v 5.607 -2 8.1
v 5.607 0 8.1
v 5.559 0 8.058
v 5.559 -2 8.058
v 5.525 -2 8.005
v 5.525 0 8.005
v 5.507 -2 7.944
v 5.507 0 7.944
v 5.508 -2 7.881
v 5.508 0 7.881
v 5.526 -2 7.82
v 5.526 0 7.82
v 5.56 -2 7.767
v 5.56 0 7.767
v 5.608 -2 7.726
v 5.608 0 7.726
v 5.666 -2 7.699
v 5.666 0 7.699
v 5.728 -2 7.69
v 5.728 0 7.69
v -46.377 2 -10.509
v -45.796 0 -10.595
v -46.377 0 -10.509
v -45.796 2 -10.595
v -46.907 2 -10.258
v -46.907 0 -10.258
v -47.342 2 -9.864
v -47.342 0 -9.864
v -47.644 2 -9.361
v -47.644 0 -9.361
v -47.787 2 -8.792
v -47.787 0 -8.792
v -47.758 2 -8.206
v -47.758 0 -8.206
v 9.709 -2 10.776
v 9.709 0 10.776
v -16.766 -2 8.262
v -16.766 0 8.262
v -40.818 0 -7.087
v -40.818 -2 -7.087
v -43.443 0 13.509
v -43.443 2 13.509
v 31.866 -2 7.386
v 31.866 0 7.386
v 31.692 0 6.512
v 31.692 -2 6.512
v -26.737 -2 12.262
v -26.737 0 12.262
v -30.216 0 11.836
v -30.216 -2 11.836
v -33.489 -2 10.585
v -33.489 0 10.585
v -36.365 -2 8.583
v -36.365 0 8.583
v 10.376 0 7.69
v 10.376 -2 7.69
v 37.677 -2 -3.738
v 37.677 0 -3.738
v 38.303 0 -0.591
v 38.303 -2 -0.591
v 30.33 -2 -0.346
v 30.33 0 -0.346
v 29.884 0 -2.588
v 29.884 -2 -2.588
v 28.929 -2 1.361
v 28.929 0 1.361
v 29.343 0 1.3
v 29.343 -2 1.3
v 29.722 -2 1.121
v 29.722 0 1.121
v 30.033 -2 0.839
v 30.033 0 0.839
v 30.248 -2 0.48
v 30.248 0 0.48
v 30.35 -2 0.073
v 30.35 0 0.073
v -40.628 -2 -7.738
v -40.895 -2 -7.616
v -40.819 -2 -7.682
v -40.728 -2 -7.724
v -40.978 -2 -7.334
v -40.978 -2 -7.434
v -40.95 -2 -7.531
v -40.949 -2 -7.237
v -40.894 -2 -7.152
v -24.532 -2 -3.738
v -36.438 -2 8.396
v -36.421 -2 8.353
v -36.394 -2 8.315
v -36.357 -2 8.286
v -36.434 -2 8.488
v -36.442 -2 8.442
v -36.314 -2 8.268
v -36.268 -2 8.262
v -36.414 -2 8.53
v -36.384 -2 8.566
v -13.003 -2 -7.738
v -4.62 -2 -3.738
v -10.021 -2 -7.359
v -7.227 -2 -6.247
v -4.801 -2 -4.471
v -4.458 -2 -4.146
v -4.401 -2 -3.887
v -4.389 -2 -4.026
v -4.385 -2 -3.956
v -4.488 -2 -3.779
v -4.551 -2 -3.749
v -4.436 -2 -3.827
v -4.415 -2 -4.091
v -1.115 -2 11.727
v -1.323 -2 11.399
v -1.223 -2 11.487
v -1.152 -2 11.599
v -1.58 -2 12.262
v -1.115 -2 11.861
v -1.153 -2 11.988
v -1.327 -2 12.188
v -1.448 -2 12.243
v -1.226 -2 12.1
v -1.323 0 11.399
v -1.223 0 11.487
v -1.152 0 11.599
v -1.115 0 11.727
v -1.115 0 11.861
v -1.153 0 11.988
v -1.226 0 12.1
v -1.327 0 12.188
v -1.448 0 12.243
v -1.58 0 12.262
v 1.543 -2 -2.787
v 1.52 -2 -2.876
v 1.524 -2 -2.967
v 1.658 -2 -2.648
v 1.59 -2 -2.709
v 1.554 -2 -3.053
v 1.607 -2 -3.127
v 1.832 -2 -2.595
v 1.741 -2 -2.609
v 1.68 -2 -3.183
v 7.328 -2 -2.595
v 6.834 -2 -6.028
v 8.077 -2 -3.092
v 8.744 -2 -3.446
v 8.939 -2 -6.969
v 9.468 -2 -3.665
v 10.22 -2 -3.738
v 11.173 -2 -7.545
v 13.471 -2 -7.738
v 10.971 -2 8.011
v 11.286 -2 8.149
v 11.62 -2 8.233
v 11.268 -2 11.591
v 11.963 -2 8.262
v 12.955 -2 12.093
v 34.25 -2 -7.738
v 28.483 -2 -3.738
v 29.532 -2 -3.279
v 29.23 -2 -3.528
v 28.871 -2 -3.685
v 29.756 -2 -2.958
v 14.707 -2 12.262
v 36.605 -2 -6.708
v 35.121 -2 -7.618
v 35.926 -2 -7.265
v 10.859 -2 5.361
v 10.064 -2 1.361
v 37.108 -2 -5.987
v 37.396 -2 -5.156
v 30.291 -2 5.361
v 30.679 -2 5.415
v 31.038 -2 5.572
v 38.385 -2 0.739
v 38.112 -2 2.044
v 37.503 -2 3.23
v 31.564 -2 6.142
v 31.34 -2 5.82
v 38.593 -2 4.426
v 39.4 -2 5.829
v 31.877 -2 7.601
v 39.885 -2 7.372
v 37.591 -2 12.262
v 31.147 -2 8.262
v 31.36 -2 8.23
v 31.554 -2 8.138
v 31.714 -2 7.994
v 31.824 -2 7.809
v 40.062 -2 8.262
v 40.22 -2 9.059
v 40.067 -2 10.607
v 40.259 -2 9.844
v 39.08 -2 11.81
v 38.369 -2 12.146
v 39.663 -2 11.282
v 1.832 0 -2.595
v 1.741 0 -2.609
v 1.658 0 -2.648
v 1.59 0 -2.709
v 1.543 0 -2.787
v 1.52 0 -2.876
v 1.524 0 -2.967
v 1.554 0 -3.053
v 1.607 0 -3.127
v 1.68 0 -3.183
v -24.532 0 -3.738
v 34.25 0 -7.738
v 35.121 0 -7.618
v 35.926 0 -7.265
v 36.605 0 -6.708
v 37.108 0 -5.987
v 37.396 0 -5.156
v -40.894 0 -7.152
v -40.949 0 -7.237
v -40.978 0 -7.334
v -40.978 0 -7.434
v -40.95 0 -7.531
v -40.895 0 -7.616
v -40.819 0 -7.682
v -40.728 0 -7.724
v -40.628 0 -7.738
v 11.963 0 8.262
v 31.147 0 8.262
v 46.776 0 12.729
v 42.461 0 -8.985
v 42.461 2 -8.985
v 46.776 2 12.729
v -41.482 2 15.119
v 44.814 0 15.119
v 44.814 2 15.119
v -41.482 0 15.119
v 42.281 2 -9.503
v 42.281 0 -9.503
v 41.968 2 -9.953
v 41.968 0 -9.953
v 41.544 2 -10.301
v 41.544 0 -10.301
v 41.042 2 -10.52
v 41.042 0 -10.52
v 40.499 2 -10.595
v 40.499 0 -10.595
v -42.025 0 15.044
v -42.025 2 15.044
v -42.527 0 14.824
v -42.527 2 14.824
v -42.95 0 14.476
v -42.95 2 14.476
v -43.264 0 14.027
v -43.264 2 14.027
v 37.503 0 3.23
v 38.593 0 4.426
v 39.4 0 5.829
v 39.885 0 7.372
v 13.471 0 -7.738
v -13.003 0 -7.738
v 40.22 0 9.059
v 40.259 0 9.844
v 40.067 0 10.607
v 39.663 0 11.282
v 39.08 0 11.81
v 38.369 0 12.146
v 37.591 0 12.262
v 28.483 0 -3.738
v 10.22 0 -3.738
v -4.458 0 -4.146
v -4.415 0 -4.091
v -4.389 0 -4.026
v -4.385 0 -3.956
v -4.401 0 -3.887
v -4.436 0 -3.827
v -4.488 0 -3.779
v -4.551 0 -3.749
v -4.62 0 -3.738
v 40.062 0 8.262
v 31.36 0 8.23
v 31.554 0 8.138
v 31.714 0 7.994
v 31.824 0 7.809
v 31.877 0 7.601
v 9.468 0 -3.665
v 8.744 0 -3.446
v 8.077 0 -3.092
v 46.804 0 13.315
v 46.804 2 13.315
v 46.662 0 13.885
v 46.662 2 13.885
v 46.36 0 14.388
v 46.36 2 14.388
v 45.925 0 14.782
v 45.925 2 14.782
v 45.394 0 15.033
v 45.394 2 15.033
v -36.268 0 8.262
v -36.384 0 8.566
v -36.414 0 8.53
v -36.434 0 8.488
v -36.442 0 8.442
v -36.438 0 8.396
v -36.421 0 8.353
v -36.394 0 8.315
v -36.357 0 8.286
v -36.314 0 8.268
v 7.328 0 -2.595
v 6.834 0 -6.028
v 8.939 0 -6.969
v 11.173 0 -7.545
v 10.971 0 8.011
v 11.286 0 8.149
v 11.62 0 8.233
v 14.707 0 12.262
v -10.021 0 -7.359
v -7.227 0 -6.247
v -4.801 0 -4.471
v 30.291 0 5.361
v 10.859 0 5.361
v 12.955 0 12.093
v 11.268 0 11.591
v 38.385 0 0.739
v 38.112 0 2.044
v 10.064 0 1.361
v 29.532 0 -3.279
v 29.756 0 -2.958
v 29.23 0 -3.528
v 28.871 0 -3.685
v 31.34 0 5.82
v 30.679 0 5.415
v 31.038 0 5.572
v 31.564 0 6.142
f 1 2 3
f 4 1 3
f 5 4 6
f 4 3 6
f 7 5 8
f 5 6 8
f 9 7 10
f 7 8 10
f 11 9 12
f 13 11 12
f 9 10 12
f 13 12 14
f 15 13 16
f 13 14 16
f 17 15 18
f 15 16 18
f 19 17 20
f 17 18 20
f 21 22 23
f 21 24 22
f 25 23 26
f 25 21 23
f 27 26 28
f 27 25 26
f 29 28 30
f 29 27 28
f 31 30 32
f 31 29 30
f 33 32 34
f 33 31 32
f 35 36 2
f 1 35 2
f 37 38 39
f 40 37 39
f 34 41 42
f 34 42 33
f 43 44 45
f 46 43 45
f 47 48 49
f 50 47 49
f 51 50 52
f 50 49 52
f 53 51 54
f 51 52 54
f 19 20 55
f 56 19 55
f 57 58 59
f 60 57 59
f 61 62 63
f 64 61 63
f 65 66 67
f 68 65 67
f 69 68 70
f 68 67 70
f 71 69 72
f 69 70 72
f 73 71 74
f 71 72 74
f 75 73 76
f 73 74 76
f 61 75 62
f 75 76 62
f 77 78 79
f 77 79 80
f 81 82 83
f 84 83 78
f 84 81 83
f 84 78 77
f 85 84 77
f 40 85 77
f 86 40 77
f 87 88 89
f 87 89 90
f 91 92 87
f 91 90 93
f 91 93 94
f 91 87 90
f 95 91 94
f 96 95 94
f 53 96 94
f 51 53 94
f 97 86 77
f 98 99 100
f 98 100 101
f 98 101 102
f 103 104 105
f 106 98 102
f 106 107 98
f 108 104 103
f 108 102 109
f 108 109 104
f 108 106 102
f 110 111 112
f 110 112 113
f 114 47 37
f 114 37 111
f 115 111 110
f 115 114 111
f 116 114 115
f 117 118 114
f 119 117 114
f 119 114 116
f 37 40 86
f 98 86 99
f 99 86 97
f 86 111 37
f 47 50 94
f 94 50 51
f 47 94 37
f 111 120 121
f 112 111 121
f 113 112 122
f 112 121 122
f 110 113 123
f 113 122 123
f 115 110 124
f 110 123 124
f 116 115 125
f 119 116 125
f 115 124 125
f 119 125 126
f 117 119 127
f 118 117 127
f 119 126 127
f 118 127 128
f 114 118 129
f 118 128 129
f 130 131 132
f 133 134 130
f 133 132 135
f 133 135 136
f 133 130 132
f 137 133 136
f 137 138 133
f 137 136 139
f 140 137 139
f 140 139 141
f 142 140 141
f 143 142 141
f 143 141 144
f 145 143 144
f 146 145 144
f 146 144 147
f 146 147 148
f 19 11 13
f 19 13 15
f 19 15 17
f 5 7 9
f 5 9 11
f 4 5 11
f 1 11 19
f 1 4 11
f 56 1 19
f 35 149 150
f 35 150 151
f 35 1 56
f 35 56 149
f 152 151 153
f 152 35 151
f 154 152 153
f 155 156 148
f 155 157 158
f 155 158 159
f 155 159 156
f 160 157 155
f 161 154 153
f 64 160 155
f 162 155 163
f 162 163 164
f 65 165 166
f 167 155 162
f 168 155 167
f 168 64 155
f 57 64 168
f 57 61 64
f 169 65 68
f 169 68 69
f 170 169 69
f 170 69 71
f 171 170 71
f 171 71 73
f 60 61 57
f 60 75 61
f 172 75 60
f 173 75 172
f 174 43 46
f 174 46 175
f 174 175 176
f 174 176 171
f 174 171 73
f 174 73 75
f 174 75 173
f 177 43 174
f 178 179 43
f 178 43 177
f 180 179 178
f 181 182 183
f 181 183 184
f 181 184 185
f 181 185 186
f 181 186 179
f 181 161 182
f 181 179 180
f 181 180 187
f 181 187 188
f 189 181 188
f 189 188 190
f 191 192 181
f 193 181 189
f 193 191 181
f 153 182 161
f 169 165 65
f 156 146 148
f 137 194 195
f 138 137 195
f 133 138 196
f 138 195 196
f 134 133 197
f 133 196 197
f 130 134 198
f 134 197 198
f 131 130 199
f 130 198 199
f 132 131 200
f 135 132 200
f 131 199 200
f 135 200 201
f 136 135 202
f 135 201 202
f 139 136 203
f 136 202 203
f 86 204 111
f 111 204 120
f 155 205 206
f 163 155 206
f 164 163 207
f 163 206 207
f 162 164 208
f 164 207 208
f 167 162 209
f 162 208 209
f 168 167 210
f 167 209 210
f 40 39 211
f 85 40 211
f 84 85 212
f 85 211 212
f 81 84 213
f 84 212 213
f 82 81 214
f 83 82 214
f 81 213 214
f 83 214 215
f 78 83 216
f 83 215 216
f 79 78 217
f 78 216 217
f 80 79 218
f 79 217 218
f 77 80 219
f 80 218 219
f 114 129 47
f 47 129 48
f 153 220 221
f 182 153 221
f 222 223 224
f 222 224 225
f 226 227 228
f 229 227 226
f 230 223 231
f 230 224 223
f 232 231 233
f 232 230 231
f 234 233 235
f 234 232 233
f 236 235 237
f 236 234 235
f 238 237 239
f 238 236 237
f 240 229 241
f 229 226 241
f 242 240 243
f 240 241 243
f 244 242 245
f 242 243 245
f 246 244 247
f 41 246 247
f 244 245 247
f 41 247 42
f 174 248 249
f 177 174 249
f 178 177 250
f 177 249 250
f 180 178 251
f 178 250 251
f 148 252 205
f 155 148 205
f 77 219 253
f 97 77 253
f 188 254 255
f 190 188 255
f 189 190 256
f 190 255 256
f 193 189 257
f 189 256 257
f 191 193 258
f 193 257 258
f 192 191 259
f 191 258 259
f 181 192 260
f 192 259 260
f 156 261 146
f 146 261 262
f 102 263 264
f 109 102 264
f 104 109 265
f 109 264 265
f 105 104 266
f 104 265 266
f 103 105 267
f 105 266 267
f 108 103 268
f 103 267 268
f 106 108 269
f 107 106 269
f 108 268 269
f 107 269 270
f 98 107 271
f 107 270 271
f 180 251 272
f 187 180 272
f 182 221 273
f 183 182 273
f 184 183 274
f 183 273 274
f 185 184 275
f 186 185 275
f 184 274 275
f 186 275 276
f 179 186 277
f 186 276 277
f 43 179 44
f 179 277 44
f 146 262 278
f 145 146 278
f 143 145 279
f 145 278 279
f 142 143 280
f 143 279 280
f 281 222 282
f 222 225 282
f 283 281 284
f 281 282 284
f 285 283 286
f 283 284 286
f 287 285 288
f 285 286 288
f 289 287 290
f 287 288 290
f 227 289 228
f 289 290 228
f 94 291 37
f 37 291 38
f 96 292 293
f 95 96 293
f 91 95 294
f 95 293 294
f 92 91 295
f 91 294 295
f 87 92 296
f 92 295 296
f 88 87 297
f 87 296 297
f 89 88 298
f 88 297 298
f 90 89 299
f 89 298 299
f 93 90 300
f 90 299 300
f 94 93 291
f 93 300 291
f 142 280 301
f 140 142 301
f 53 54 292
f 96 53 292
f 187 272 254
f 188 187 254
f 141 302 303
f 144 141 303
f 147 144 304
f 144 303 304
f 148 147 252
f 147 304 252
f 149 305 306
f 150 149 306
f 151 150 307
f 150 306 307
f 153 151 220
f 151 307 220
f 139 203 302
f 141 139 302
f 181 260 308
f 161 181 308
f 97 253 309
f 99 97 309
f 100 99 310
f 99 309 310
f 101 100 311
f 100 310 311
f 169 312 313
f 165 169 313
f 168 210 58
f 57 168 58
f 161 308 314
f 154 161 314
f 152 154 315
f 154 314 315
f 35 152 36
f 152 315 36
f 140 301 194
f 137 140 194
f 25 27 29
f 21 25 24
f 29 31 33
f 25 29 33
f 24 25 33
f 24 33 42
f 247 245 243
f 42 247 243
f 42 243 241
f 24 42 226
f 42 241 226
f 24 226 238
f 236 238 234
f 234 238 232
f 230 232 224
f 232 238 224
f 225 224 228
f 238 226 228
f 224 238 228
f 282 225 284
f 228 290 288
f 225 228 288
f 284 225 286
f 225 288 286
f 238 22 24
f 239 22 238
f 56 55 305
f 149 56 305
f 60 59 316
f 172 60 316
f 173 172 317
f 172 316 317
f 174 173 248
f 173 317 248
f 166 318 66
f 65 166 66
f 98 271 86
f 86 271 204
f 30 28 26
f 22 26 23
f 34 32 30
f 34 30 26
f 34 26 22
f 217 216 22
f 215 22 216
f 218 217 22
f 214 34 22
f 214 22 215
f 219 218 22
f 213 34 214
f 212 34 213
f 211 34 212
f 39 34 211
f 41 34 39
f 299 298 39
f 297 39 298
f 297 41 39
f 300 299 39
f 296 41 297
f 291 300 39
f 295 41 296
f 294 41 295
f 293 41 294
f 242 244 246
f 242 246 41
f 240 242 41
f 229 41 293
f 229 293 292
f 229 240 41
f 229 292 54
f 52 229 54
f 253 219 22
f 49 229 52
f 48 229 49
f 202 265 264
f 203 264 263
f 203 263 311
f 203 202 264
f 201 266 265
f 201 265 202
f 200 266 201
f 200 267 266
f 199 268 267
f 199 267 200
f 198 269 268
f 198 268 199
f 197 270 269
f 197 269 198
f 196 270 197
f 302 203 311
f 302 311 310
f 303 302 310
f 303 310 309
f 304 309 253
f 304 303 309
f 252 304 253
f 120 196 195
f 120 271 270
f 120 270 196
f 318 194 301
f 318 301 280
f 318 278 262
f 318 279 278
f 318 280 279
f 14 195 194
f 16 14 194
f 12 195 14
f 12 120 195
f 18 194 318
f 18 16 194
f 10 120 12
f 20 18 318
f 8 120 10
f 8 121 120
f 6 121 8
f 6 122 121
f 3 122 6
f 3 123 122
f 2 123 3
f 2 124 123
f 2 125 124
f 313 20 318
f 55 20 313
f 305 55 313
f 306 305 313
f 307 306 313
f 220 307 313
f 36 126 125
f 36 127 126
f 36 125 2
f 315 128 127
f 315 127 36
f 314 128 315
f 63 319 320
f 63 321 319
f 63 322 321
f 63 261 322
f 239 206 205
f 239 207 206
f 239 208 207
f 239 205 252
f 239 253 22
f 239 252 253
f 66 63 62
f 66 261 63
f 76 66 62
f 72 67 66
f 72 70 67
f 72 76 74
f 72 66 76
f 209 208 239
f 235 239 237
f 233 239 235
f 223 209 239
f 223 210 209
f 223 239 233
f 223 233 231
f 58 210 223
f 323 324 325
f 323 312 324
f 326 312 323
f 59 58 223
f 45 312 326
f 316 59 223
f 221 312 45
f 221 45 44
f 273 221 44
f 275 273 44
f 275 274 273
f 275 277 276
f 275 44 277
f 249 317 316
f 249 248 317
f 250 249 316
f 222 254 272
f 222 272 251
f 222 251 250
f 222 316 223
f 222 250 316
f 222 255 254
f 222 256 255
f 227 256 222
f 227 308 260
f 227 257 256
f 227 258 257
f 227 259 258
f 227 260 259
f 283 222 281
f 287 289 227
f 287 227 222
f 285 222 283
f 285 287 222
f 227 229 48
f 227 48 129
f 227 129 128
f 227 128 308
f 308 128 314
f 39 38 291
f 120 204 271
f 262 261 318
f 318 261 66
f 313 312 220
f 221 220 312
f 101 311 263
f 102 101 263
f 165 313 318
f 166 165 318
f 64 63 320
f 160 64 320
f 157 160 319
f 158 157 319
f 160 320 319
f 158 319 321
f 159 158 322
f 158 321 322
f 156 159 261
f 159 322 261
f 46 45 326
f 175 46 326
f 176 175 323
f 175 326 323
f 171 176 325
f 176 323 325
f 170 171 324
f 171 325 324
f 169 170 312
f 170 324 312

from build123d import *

# Parameters (mm, degrees)
F1_DEPTH = 7
F2_DEPTH = 7
F3_SCALE = 0.2857142857
F4_R     = 2


with BuildPart() as f1:
    # F0 (on Front) → F1 (new body)
    with BuildSketch(Plane.XZ):
        Polygon((147.4933057071, -37.0837153708), (165.3765259448, 52.9162846292), (-150.931521252, 52.9162846292), (-168.8147414897, -37.0837153708), align=None)
        with BuildLine():
            ThreePointArc((-142.1973491985, -27.0837153708), (-143.3851815175, -26.1930259545), (-142.862989539, -24.8032098545))
            Line((-142.862989539, -24.8032098545), (-58.6805177571, 28.9162846292))
            Line((-58.6805177571, 28.9162846292), (-126.9385200674, 28.9162846292))
            ThreePointArc((-126.9385200674, 28.9162846292), (-127.5078443538, 29.3082097622), (-127.3449539143, 29.9799255933))
            Line((-127.3449539143, 29.9799255933), (-127.2790222066, 30.0389277041))
            ThreePointArc((-127.2790222066, 30.0389277041), (-111.6172057975, 39.5872981724), (-93.5788654913, 42.9162846292))
            Line((-93.5788654913, 42.9162846292), (-5.5300716236, 42.9162846292))
            ThreePointArc((-5.5300716236, 42.9162846292), (-3.9542047196, 41.7407419895), (-4.6319434734, 39.8952265659))
            Line((-4.6319434734, 39.8952265659), (-85.8602612303, -13.0837153708))
            Line((-85.8602612303, -13.0837153708), (-16.1713797912, -13.0837153708))
            ThreePointArc((-16.1713797912, -13.0837153708), (-15.4024508391, -13.6051323257), (-15.6023385777, -14.5124207397))
            Line((-15.6023385777, -14.5124207397), (-16.8030846787, -15.64925817))
            ThreePointArc((-16.8030846787, -15.64925817), (-30.0607978631, -24.1199204391), (-45.5118495348, -27.0837153708))
            Line((-45.5118495348, -27.0837153708), (-142.1973491985, -27.0837153708))
        make_face(mode=Mode.SUBTRACT)
        with BuildLine():
            Line((106.0489553402, 28.9162846292), (41.869228107, 28.9162846292))
            ThreePointArc((41.869228107, 28.9162846292), (40.0797780502, 28.6938397575), (38.3992524714, 28.0400454431))
            Line((38.3992524714, 28.0400454431), (36.3160483539, 26.9162846292))
            Line((36.3160483539, 26.9162846292), (20.0493094875, 26.9162846292))
            ThreePointArc((20.0493094875, 26.9162846292), (19.3010202491, 27.474482726), (19.6228396963, 28.3508126542))
            Line((19.6228396963, 28.3508126542), (33.9806112595, 37.7152752825))
            ThreePointArc((33.9806112595, 37.7152752825), (42.3496315662, 41.5885064265), (51.4753877229, 42.9162846292))
            Line((51.4753877229, 42.9162846292), (131.5684478923, 42.9162846292))
            ThreePointArc((131.5684478923, 42.9162846292), (138.8204863429, 39.4867738937), (140.7708688735, 31.7054106738))
            Line((140.7708688735, 31.7054106738), (140.2166627032, 28.9162846292))
            Line((140.2166627032, 28.9162846292), (139.5981588527, 25.8035708221))
            ThreePointArc((139.5981588527, 25.8035708221), (136.6200902795, 17.8684779813), (131.2590653991, 11.3038757046))
            ThreePointArc((131.2590653991, 11.3038757046), (134.023896113, 4.9032216546), (134.0598180061, -2.0689638538))
            Line((134.0598180061, -2.0689638538), (131.8711599256, -13.0837153708))
            Line((131.8711599256, -13.0837153708), (130.884948536, -18.0469727646))
            ThreePointArc((130.884948536, -18.0469727646), (126.99738704, -24.5352055481), (119.8759127038, -27.0837153708))
            Line((119.8759127038, -27.0837153708), (47.1499341011, -27.0837153708))
            ThreePointArc((47.1499341011, -27.0837153708), (35.1544316326, -25.5630169154), (23.9178624463, -21.0971333315))
            Line((23.9178624463, -21.0971333315), (5.8807617496, -11.1401478834))
            ThreePointArc((5.8807617496, -11.1401478834), (5.3488703402, -9.9065948541), (6.4106758325, -9.0837153708))
            Line((6.4106758325, -9.0837153708), (25.6471037865, -9.0837153708))
            Line((25.6471037865, -9.0837153708), (28.2685634943, -10.8223722179))
            ThreePointArc((28.2685634943, -10.8223722179), (31.8522465321, -12.5060863745), (35.7693911833, -13.0837153708))
            Line((35.7693911833, -13.0837153708), (99.6904770334, -13.0837153708))
            ThreePointArc((99.6904770334, -13.0837153708), (102.8628336901, -11.9484473464), (104.594600317, -9.058176668))
            Line((104.594600317, -9.058176668), (106.1541152114, -1.209683017))
            ThreePointArc((106.1541152114, -1.209683017), (105.1147239034, 2.9371349369), (101.2499919278, 4.7647782803))
            Line((101.2499919278, 4.7647782803), (35.2246427987, 4.7647782803))
            Line((35.2246427987, 4.7647782803), (38.0064770579, 18.7647782803))
            Line((38.0064770579, 18.7647782803), (106.0188506579, 18.7647782803))
            ThreePointArc((106.0188506579, 18.7647782803), (109.1912073145, 19.9000463047), (110.9229739414, 22.790316983))
            Line((110.9229739414, 22.790316983), (111.5311561589, 25.8510856166))
            ThreePointArc((111.5311561589, 25.8510856166), (110.9978961623, 27.9786117089), (109.0150943587, 28.9162846292))
            Line((109.0150943587, 28.9162846292), (106.0489553402, 28.9162846292))
        make_face(mode=Mode.SUBTRACT)
        with BuildLine():
            Line((-58.6805177571, 28.9162846292), (-142.862989539, -24.8032098545))
            ThreePointArc((-142.862989539, -24.8032098545), (-143.3851815175, -26.1930259545), (-142.1973491985, -27.0837153708))
            Line((-142.1973491985, -27.0837153708), (-45.5118495348, -27.0837153708))
            ThreePointArc((-45.5118495348, -27.0837153708), (-30.0607978631, -24.1199204391), (-16.8030846787, -15.64925817))
            Line((-16.8030846787, -15.64925817), (-15.6023385777, -14.5124207397))
            ThreePointArc((-15.6023385777, -14.5124207397), (-15.4024508391, -13.6051323257), (-16.1713797912, -13.0837153708))
            Line((-16.1713797912, -13.0837153708), (-85.8602612303, -13.0837153708))
            Line((-85.8602612303, -13.0837153708), (-4.6319434734, 39.8952265659))
            ThreePointArc((-4.6319434734, 39.8952265659), (-3.9542047196, 41.7407419895), (-5.5300716236, 42.9162846292))
            Line((-5.5300716236, 42.9162846292), (-93.5788654913, 42.9162846292))
            ThreePointArc((-93.5788654913, 42.9162846292), (-111.6172057975, 39.5872981724), (-127.2790222066, 30.0389277041))
            Line((-127.2790222066, 30.0389277041), (-127.3449539143, 29.9799255933))
            ThreePointArc((-127.3449539143, 29.9799255933), (-127.5078443538, 29.3082097622), (-126.9385200674, 28.9162846292))
            Line((-126.9385200674, 28.9162846292), (-58.6805177571, 28.9162846292))
        make_face()
        with BuildLine():
            ThreePointArc((38.3992524714, 28.0400454431), (40.0797780502, 28.6938397575), (41.869228107, 28.9162846292))
            Line((41.869228107, 28.9162846292), (106.0489553402, 28.9162846292))
            Line((106.0489553402, 28.9162846292), (109.0150943587, 28.9162846292))
            ThreePointArc((109.0150943587, 28.9162846292), (110.9978961623, 27.9786117089), (111.5311561589, 25.8510856166))
            Line((111.5311561589, 25.8510856166), (110.9229739414, 22.790316983))
            ThreePointArc((110.9229739414, 22.790316983), (109.1912073145, 19.9000463047), (106.0188506579, 18.7647782803))
            Line((106.0188506579, 18.7647782803), (38.0064770579, 18.7647782803))
            Line((38.0064770579, 18.7647782803), (35.2246427987, 4.7647782803))
            Line((35.2246427987, 4.7647782803), (101.2499919278, 4.7647782803))
            ThreePointArc((101.2499919278, 4.7647782803), (105.1147239034, 2.9371349369), (106.1541152114, -1.209683017))
            Line((106.1541152114, -1.209683017), (104.594600317, -9.058176668))
            ThreePointArc((104.594600317, -9.058176668), (102.8628336901, -11.9484473464), (99.6904770334, -13.0837153708))
            Line((99.6904770334, -13.0837153708), (35.7693911833, -13.0837153708))
            ThreePointArc((35.7693911833, -13.0837153708), (31.8522465321, -12.5060863745), (28.2685634943, -10.8223722179))
            Line((28.2685634943, -10.8223722179), (25.6471037865, -9.0837153708))
            Line((25.6471037865, -9.0837153708), (6.4106758325, -9.0837153708))
            ThreePointArc((6.4106758325, -9.0837153708), (5.3488703402, -9.9065948541), (5.8807617496, -11.1401478834))
            Line((5.8807617496, -11.1401478834), (23.9178624463, -21.0971333315))
            ThreePointArc((23.9178624463, -21.0971333315), (35.1544316326, -25.5630169154), (47.1499341011, -27.0837153708))
            Line((47.1499341011, -27.0837153708), (119.8759127038, -27.0837153708))
            ThreePointArc((119.8759127038, -27.0837153708), (126.99738704, -24.5352055481), (130.884948536, -18.0469727646))
            Line((130.884948536, -18.0469727646), (131.8711599256, -13.0837153708))
            Line((131.8711599256, -13.0837153708), (134.0598180061, -2.0689638538))
            ThreePointArc((134.0598180061, -2.0689638538), (134.023896113, 4.9032216546), (131.2590653991, 11.3038757046))
            ThreePointArc((131.2590653991, 11.3038757046), (136.6200902795, 17.8684779813), (139.5981588527, 25.8035708221))
            Line((139.5981588527, 25.8035708221), (140.2166627032, 28.9162846292))
            Line((140.2166627032, 28.9162846292), (140.7708688735, 31.7054106738))
            ThreePointArc((140.7708688735, 31.7054106738), (138.8204863429, 39.4867738937), (131.5684478923, 42.9162846292))
            Line((131.5684478923, 42.9162846292), (51.4753877229, 42.9162846292))
            ThreePointArc((51.4753877229, 42.9162846292), (42.3496315662, 41.5885064265), (33.9806112595, 37.7152752825))
            Line((33.9806112595, 37.7152752825), (19.6228396963, 28.3508126542))
            ThreePointArc((19.6228396963, 28.3508126542), (19.3010202491, 27.474482726), (20.0493094875, 26.9162846292))
            Line((20.0493094875, 26.9162846292), (36.3160483539, 26.9162846292))
            Line((36.3160483539, 26.9162846292), (38.3992524714, 28.0400454431))
        make_face()
    extrude(amount=-F1_DEPTH)

    # F0 (on Front) → F2 (join)
    with BuildSketch(Plane.XZ):
        with BuildLine():
            Line((-58.6805177571, 28.9162846292), (-142.862989539, -24.8032098545))
            ThreePointArc((-142.862989539, -24.8032098545), (-143.3851815175, -26.1930259545), (-142.1973491985, -27.0837153708))
            Line((-142.1973491985, -27.0837153708), (-45.5118495348, -27.0837153708))
            ThreePointArc((-45.5118495348, -27.0837153708), (-30.0607978631, -24.1199204391), (-16.8030846787, -15.64925817))
            Line((-16.8030846787, -15.64925817), (-15.6023385777, -14.5124207397))
            ThreePointArc((-15.6023385777, -14.5124207397), (-15.4024508391, -13.6051323257), (-16.1713797912, -13.0837153708))
            Line((-16.1713797912, -13.0837153708), (-85.8602612303, -13.0837153708))
            Line((-85.8602612303, -13.0837153708), (-4.6319434734, 39.8952265659))
            ThreePointArc((-4.6319434734, 39.8952265659), (-3.9542047196, 41.7407419895), (-5.5300716236, 42.9162846292))
            Line((-5.5300716236, 42.9162846292), (-93.5788654913, 42.9162846292))
            ThreePointArc((-93.5788654913, 42.9162846292), (-111.6172057975, 39.5872981724), (-127.2790222066, 30.0389277041))
            Line((-127.2790222066, 30.0389277041), (-127.3449539143, 29.9799255933))
            ThreePointArc((-127.3449539143, 29.9799255933), (-127.5078443538, 29.3082097622), (-126.9385200674, 28.9162846292))
            Line((-126.9385200674, 28.9162846292), (-58.6805177571, 28.9162846292))
        make_face()
        with BuildLine():
            ThreePointArc((38.3992524714, 28.0400454431), (40.0797780502, 28.6938397575), (41.869228107, 28.9162846292))
            Line((41.869228107, 28.9162846292), (106.0489553402, 28.9162846292))
            Line((106.0489553402, 28.9162846292), (109.0150943587, 28.9162846292))
            ThreePointArc((109.0150943587, 28.9162846292), (110.9978961623, 27.9786117089), (111.5311561589, 25.8510856166))
            Line((111.5311561589, 25.8510856166), (110.9229739414, 22.790316983))
            ThreePointArc((110.9229739414, 22.790316983), (109.1912073145, 19.9000463047), (106.0188506579, 18.7647782803))
            Line((106.0188506579, 18.7647782803), (38.0064770579, 18.7647782803))
            Line((38.0064770579, 18.7647782803), (35.2246427987, 4.7647782803))
            Line((35.2246427987, 4.7647782803), (101.2499919278, 4.7647782803))
            ThreePointArc((101.2499919278, 4.7647782803), (105.1147239034, 2.9371349369), (106.1541152114, -1.209683017))
            Line((106.1541152114, -1.209683017), (104.594600317, -9.058176668))
            ThreePointArc((104.594600317, -9.058176668), (102.8628336901, -11.9484473464), (99.6904770334, -13.0837153708))
            Line((99.6904770334, -13.0837153708), (35.7693911833, -13.0837153708))
            ThreePointArc((35.7693911833, -13.0837153708), (31.8522465321, -12.5060863745), (28.2685634943, -10.8223722179))
            Line((28.2685634943, -10.8223722179), (25.6471037865, -9.0837153708))
            Line((25.6471037865, -9.0837153708), (6.4106758325, -9.0837153708))
            ThreePointArc((6.4106758325, -9.0837153708), (5.3488703402, -9.9065948541), (5.8807617496, -11.1401478834))
            Line((5.8807617496, -11.1401478834), (23.9178624463, -21.0971333315))
            ThreePointArc((23.9178624463, -21.0971333315), (35.1544316326, -25.5630169154), (47.1499341011, -27.0837153708))
            Line((47.1499341011, -27.0837153708), (119.8759127038, -27.0837153708))
            ThreePointArc((119.8759127038, -27.0837153708), (126.99738704, -24.5352055481), (130.884948536, -18.0469727646))
            Line((130.884948536, -18.0469727646), (131.8711599256, -13.0837153708))
            Line((131.8711599256, -13.0837153708), (134.0598180061, -2.0689638538))
            ThreePointArc((134.0598180061, -2.0689638538), (134.023896113, 4.9032216546), (131.2590653991, 11.3038757046))
            ThreePointArc((131.2590653991, 11.3038757046), (136.6200902795, 17.8684779813), (139.5981588527, 25.8035708221))
            Line((139.5981588527, 25.8035708221), (140.2166627032, 28.9162846292))
            Line((140.2166627032, 28.9162846292), (140.7708688735, 31.7054106738))
            ThreePointArc((140.7708688735, 31.7054106738), (138.8204863429, 39.4867738937), (131.5684478923, 42.9162846292))
            Line((131.5684478923, 42.9162846292), (51.4753877229, 42.9162846292))
            ThreePointArc((51.4753877229, 42.9162846292), (42.3496315662, 41.5885064265), (33.9806112595, 37.7152752825))
            Line((33.9806112595, 37.7152752825), (19.6228396963, 28.3508126542))
            ThreePointArc((19.6228396963, 28.3508126542), (19.3010202491, 27.474482726), (20.0493094875, 26.9162846292))
            Line((20.0493094875, 26.9162846292), (36.3160483539, 26.9162846292))
            Line((36.3160483539, 26.9162846292), (38.3992524714, 28.0400454431))
        make_face()
    extrude(amount=F2_DEPTH)


with BuildPart() as f1_1:
    # F3: moved
    add(f1.part.scale(F3_SCALE))

    # F4
    f4_edges = [f1_1.edges().sort_by_distance(p)[0] for p in [
        (-48.232783, 1, -10.595347),
        (-43.123292, 1, 15.118938),
        (47.250436, 1, 15.118938),
        (42.140944, 1, -10.595347),
    ]]
    fillet(f4_edges, radius=F4_R)


solid = f1_1.part
